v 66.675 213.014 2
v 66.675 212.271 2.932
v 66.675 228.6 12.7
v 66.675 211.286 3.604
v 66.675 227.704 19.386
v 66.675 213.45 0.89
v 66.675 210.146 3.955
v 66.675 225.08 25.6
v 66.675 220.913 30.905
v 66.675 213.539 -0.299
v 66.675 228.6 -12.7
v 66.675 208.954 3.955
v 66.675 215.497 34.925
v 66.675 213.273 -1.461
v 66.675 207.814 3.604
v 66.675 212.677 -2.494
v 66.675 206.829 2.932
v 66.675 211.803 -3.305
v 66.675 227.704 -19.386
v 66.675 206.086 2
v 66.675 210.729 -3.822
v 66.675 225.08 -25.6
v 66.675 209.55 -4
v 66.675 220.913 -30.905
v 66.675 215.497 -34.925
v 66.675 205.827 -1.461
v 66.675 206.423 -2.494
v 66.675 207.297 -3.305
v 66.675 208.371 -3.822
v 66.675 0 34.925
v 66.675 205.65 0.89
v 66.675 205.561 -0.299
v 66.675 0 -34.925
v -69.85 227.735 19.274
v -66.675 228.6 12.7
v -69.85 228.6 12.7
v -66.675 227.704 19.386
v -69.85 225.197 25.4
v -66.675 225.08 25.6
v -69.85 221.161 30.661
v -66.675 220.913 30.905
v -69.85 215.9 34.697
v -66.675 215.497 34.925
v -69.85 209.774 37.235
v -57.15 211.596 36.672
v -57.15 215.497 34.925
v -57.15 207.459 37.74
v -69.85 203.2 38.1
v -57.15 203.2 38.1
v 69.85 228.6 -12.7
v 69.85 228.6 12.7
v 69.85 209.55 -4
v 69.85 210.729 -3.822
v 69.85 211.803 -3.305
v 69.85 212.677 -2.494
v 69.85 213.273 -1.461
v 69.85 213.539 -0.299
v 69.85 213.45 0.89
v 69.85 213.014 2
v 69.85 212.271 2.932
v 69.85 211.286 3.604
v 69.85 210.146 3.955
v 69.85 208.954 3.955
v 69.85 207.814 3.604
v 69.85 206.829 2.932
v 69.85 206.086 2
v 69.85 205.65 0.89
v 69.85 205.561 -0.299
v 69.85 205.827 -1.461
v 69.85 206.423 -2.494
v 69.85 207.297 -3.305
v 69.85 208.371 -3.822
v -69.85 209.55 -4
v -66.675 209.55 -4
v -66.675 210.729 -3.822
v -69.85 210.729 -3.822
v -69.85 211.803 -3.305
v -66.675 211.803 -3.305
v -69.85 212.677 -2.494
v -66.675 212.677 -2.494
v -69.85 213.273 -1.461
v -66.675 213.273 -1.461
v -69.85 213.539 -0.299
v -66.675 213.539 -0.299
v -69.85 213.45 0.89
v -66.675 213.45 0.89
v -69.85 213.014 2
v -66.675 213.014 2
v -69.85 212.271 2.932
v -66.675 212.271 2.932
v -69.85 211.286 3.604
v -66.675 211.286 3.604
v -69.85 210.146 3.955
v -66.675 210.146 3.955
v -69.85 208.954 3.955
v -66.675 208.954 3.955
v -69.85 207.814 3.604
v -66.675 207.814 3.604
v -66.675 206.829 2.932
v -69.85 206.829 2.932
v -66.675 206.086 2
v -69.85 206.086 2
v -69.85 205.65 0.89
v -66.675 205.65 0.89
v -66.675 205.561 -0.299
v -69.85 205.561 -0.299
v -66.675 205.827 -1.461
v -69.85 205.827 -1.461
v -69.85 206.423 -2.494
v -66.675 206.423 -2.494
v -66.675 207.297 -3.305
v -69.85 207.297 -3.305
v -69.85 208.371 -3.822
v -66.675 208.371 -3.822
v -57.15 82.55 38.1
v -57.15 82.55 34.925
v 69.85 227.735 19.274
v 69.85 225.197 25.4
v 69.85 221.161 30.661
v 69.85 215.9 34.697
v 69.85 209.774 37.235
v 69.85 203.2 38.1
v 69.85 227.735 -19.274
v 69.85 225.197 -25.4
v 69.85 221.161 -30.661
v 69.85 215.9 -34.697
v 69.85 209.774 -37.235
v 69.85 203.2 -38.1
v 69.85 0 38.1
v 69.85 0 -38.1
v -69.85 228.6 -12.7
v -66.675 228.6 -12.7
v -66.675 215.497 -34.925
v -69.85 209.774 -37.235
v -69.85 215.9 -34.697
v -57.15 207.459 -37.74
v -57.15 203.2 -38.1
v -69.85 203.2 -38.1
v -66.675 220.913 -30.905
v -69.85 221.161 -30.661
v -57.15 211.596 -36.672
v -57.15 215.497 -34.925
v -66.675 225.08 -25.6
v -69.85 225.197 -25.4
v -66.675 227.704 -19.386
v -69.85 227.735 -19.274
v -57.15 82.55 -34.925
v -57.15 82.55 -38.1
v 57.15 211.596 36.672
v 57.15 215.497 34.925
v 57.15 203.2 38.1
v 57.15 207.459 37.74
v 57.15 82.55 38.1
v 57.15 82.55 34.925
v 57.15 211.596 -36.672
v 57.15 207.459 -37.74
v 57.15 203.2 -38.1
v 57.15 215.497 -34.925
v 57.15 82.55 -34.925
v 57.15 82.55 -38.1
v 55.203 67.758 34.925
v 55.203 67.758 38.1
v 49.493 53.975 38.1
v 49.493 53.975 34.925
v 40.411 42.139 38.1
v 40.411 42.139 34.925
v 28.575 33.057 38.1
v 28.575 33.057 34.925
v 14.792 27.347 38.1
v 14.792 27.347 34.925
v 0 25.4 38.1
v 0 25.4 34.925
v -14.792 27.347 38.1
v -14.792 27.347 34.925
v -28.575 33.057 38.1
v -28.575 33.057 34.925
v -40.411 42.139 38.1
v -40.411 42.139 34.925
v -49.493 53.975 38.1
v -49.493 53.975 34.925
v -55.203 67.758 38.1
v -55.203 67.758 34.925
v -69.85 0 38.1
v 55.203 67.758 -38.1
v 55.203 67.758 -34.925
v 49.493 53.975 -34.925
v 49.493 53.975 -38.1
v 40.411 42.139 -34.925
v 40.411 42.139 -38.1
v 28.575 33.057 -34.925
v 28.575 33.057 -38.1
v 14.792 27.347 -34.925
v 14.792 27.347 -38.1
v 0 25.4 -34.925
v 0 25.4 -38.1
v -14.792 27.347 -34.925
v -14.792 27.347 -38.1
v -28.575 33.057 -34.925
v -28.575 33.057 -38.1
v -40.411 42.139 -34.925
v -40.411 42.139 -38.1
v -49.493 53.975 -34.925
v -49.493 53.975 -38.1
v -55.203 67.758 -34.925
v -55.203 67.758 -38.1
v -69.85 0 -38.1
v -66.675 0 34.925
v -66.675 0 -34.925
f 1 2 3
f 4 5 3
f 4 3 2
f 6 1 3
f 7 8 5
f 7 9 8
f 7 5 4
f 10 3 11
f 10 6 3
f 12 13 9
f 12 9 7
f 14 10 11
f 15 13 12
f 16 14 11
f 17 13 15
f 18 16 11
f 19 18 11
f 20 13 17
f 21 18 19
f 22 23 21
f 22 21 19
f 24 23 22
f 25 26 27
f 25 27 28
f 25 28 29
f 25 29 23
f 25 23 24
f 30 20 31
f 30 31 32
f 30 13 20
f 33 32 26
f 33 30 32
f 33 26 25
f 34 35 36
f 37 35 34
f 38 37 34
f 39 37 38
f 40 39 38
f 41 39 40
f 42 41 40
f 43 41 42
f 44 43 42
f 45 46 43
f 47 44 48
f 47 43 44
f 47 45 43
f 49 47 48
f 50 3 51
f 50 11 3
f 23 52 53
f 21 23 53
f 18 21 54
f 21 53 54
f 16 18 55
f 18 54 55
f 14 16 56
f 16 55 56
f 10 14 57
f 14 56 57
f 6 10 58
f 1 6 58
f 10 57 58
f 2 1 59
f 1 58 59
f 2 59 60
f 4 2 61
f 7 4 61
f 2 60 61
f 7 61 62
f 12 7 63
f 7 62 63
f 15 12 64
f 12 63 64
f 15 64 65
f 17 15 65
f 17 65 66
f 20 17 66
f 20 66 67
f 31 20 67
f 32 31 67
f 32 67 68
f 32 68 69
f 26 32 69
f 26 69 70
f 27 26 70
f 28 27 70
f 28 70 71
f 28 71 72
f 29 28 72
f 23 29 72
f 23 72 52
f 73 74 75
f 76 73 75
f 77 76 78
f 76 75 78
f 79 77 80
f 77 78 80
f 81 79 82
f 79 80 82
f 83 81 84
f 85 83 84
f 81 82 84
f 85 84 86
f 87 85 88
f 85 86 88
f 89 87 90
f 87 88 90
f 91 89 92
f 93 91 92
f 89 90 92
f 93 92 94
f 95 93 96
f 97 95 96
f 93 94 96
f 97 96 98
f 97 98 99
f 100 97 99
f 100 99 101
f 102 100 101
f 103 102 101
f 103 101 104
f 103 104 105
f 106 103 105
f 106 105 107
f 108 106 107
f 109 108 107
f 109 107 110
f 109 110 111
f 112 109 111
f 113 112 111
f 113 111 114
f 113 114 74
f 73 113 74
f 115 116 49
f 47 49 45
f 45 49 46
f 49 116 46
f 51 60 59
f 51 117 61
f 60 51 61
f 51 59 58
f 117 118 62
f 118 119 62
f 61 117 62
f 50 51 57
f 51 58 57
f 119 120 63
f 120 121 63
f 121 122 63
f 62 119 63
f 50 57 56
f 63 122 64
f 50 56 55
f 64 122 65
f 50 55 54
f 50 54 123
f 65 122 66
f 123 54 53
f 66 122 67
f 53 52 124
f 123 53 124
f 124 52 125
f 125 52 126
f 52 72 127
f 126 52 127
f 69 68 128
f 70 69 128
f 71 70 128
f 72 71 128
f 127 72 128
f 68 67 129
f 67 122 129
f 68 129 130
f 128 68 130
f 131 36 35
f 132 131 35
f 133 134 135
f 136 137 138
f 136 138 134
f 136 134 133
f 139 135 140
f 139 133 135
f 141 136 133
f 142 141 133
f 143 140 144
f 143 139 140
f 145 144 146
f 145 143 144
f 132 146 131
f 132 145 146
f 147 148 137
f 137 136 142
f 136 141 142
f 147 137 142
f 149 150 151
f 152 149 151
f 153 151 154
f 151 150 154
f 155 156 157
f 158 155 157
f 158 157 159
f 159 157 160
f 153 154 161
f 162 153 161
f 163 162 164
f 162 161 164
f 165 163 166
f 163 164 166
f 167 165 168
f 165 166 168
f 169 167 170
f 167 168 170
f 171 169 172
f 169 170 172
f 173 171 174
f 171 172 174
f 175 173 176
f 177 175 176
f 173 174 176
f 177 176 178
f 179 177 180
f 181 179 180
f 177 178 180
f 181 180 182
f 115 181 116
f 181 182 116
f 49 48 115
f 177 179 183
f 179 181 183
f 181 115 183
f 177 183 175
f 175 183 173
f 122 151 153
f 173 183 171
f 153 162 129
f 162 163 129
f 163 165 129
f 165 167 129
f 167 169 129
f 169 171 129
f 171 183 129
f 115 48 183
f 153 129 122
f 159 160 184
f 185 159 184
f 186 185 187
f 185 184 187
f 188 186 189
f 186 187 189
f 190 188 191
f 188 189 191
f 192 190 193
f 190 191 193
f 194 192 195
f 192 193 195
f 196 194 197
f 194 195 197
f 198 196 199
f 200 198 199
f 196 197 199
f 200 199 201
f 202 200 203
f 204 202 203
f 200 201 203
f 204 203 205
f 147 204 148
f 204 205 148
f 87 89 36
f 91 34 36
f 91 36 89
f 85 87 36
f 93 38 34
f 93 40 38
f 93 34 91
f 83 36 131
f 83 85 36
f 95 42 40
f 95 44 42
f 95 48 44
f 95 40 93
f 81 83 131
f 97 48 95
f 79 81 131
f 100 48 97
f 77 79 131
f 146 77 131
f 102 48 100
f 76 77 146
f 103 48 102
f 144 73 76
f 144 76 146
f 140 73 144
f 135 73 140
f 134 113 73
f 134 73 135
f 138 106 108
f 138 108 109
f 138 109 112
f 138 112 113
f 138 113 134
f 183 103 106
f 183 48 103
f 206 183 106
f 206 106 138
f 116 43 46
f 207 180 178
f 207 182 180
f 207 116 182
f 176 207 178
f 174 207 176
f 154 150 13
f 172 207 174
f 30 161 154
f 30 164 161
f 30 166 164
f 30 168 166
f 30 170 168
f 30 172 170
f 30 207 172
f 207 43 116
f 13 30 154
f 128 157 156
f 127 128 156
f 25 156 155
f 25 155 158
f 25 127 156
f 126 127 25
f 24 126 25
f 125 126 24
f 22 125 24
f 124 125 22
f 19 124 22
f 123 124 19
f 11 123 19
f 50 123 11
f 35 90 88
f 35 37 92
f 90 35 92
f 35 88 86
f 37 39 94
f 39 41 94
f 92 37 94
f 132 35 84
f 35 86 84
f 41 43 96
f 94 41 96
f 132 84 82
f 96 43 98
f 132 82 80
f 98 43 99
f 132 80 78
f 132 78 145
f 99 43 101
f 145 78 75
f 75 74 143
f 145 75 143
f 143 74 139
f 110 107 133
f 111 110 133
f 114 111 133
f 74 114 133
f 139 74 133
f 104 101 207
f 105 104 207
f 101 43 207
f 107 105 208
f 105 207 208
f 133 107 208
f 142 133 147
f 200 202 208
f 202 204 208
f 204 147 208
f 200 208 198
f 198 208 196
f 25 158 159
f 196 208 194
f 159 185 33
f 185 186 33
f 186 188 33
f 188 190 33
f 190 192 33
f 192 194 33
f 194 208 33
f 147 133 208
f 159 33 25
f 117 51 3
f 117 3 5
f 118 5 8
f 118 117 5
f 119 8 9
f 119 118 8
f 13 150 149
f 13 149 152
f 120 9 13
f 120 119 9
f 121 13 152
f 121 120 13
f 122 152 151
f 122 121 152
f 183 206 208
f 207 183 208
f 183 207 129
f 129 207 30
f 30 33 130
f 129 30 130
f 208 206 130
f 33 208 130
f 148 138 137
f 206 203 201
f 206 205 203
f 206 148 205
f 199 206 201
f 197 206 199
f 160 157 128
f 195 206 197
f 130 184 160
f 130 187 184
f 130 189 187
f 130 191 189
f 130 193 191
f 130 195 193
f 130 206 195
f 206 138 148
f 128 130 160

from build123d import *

# Parameters (mm, degrees)
SKETCH1_W               = 139.7
SKETCH1_H               = 76.2
SKETCH1_W_2             = 133.35
SKETCH1_H_2             = 69.85
BOSS_EXTRUDE1_DEPTH     = 228.6
SKETCH2_R               = 4
CUT_EXTRUDE1_DEPTH      = 271.602402059
CUT_EXTRUDE2_DEPTH      = 251.885277567
CUT_EXTRUDE2_DEPTH_BACK = 251.885277567


with BuildPart() as part:
    # Sketch1 → Boss-Extrude1 (new body)
    with BuildSketch(Plane(origin=(0, 0, 0), x_dir=(1, 0, 0), z_dir=(0, 1, 0))):
        Rectangle(SKETCH1_W, SKETCH1_H)
        Rectangle(SKETCH1_W_2, SKETCH1_H_2, mode=Mode.SUBTRACT)
    extrude(amount=BOSS_EXTRUDE1_DEPTH)

    # Sketch2 → Cut-Extrude1 (cut, through all)
    with BuildSketch(Plane(origin=(69.85, 0, 0), x_dir=(0, 0, -1), z_dir=(1, 0, 0))):
        with Locations((0, 209.55)):
            Circle(SKETCH2_R)
        with BuildLine():
            Line((-38.1, 203.2), (-38.1, 228.6))
            Line((-38.1, 228.6), (-12.7, 228.6))
            ThreePointArc((-12.7, 228.6), (-30.660512242, 221.160512242), (-38.1, 203.2))
        make_face()
        with BuildLine():
            Line((12.7, 228.6), (38.1, 228.6))
            Line((38.1, 228.6), (38.1, 203.2))
            ThreePointArc((38.1, 203.2), (30.660512242, 221.160512242), (12.7, 228.6))
        make_face()
    extrude(amount=-CUT_EXTRUDE1_DEPTH, mode=Mode.SUBTRACT)

    # Sketch3 → Cut-Extrude2 (cut, two sides: drawn at the far end of the back side and taken through both)
    with BuildSketch(Plane.XY.offset(38.1).offset(-CUT_EXTRUDE2_DEPTH_BACK)):
        with BuildLine():
            Line((-57.15, 82.55), (-57.15, 228.6))
            Line((-57.15, 228.6), (57.15, 228.6))
            Line((57.15, 228.6), (57.15, 82.55))
            ThreePointArc((57.15, 82.55), (0, 25.4), (-57.15, 82.55))
        make_face()
    extrude(amount=CUT_EXTRUDE2_DEPTH + CUT_EXTRUDE2_DEPTH_BACK, mode=Mode.SUBTRACT)


solid = part.part
